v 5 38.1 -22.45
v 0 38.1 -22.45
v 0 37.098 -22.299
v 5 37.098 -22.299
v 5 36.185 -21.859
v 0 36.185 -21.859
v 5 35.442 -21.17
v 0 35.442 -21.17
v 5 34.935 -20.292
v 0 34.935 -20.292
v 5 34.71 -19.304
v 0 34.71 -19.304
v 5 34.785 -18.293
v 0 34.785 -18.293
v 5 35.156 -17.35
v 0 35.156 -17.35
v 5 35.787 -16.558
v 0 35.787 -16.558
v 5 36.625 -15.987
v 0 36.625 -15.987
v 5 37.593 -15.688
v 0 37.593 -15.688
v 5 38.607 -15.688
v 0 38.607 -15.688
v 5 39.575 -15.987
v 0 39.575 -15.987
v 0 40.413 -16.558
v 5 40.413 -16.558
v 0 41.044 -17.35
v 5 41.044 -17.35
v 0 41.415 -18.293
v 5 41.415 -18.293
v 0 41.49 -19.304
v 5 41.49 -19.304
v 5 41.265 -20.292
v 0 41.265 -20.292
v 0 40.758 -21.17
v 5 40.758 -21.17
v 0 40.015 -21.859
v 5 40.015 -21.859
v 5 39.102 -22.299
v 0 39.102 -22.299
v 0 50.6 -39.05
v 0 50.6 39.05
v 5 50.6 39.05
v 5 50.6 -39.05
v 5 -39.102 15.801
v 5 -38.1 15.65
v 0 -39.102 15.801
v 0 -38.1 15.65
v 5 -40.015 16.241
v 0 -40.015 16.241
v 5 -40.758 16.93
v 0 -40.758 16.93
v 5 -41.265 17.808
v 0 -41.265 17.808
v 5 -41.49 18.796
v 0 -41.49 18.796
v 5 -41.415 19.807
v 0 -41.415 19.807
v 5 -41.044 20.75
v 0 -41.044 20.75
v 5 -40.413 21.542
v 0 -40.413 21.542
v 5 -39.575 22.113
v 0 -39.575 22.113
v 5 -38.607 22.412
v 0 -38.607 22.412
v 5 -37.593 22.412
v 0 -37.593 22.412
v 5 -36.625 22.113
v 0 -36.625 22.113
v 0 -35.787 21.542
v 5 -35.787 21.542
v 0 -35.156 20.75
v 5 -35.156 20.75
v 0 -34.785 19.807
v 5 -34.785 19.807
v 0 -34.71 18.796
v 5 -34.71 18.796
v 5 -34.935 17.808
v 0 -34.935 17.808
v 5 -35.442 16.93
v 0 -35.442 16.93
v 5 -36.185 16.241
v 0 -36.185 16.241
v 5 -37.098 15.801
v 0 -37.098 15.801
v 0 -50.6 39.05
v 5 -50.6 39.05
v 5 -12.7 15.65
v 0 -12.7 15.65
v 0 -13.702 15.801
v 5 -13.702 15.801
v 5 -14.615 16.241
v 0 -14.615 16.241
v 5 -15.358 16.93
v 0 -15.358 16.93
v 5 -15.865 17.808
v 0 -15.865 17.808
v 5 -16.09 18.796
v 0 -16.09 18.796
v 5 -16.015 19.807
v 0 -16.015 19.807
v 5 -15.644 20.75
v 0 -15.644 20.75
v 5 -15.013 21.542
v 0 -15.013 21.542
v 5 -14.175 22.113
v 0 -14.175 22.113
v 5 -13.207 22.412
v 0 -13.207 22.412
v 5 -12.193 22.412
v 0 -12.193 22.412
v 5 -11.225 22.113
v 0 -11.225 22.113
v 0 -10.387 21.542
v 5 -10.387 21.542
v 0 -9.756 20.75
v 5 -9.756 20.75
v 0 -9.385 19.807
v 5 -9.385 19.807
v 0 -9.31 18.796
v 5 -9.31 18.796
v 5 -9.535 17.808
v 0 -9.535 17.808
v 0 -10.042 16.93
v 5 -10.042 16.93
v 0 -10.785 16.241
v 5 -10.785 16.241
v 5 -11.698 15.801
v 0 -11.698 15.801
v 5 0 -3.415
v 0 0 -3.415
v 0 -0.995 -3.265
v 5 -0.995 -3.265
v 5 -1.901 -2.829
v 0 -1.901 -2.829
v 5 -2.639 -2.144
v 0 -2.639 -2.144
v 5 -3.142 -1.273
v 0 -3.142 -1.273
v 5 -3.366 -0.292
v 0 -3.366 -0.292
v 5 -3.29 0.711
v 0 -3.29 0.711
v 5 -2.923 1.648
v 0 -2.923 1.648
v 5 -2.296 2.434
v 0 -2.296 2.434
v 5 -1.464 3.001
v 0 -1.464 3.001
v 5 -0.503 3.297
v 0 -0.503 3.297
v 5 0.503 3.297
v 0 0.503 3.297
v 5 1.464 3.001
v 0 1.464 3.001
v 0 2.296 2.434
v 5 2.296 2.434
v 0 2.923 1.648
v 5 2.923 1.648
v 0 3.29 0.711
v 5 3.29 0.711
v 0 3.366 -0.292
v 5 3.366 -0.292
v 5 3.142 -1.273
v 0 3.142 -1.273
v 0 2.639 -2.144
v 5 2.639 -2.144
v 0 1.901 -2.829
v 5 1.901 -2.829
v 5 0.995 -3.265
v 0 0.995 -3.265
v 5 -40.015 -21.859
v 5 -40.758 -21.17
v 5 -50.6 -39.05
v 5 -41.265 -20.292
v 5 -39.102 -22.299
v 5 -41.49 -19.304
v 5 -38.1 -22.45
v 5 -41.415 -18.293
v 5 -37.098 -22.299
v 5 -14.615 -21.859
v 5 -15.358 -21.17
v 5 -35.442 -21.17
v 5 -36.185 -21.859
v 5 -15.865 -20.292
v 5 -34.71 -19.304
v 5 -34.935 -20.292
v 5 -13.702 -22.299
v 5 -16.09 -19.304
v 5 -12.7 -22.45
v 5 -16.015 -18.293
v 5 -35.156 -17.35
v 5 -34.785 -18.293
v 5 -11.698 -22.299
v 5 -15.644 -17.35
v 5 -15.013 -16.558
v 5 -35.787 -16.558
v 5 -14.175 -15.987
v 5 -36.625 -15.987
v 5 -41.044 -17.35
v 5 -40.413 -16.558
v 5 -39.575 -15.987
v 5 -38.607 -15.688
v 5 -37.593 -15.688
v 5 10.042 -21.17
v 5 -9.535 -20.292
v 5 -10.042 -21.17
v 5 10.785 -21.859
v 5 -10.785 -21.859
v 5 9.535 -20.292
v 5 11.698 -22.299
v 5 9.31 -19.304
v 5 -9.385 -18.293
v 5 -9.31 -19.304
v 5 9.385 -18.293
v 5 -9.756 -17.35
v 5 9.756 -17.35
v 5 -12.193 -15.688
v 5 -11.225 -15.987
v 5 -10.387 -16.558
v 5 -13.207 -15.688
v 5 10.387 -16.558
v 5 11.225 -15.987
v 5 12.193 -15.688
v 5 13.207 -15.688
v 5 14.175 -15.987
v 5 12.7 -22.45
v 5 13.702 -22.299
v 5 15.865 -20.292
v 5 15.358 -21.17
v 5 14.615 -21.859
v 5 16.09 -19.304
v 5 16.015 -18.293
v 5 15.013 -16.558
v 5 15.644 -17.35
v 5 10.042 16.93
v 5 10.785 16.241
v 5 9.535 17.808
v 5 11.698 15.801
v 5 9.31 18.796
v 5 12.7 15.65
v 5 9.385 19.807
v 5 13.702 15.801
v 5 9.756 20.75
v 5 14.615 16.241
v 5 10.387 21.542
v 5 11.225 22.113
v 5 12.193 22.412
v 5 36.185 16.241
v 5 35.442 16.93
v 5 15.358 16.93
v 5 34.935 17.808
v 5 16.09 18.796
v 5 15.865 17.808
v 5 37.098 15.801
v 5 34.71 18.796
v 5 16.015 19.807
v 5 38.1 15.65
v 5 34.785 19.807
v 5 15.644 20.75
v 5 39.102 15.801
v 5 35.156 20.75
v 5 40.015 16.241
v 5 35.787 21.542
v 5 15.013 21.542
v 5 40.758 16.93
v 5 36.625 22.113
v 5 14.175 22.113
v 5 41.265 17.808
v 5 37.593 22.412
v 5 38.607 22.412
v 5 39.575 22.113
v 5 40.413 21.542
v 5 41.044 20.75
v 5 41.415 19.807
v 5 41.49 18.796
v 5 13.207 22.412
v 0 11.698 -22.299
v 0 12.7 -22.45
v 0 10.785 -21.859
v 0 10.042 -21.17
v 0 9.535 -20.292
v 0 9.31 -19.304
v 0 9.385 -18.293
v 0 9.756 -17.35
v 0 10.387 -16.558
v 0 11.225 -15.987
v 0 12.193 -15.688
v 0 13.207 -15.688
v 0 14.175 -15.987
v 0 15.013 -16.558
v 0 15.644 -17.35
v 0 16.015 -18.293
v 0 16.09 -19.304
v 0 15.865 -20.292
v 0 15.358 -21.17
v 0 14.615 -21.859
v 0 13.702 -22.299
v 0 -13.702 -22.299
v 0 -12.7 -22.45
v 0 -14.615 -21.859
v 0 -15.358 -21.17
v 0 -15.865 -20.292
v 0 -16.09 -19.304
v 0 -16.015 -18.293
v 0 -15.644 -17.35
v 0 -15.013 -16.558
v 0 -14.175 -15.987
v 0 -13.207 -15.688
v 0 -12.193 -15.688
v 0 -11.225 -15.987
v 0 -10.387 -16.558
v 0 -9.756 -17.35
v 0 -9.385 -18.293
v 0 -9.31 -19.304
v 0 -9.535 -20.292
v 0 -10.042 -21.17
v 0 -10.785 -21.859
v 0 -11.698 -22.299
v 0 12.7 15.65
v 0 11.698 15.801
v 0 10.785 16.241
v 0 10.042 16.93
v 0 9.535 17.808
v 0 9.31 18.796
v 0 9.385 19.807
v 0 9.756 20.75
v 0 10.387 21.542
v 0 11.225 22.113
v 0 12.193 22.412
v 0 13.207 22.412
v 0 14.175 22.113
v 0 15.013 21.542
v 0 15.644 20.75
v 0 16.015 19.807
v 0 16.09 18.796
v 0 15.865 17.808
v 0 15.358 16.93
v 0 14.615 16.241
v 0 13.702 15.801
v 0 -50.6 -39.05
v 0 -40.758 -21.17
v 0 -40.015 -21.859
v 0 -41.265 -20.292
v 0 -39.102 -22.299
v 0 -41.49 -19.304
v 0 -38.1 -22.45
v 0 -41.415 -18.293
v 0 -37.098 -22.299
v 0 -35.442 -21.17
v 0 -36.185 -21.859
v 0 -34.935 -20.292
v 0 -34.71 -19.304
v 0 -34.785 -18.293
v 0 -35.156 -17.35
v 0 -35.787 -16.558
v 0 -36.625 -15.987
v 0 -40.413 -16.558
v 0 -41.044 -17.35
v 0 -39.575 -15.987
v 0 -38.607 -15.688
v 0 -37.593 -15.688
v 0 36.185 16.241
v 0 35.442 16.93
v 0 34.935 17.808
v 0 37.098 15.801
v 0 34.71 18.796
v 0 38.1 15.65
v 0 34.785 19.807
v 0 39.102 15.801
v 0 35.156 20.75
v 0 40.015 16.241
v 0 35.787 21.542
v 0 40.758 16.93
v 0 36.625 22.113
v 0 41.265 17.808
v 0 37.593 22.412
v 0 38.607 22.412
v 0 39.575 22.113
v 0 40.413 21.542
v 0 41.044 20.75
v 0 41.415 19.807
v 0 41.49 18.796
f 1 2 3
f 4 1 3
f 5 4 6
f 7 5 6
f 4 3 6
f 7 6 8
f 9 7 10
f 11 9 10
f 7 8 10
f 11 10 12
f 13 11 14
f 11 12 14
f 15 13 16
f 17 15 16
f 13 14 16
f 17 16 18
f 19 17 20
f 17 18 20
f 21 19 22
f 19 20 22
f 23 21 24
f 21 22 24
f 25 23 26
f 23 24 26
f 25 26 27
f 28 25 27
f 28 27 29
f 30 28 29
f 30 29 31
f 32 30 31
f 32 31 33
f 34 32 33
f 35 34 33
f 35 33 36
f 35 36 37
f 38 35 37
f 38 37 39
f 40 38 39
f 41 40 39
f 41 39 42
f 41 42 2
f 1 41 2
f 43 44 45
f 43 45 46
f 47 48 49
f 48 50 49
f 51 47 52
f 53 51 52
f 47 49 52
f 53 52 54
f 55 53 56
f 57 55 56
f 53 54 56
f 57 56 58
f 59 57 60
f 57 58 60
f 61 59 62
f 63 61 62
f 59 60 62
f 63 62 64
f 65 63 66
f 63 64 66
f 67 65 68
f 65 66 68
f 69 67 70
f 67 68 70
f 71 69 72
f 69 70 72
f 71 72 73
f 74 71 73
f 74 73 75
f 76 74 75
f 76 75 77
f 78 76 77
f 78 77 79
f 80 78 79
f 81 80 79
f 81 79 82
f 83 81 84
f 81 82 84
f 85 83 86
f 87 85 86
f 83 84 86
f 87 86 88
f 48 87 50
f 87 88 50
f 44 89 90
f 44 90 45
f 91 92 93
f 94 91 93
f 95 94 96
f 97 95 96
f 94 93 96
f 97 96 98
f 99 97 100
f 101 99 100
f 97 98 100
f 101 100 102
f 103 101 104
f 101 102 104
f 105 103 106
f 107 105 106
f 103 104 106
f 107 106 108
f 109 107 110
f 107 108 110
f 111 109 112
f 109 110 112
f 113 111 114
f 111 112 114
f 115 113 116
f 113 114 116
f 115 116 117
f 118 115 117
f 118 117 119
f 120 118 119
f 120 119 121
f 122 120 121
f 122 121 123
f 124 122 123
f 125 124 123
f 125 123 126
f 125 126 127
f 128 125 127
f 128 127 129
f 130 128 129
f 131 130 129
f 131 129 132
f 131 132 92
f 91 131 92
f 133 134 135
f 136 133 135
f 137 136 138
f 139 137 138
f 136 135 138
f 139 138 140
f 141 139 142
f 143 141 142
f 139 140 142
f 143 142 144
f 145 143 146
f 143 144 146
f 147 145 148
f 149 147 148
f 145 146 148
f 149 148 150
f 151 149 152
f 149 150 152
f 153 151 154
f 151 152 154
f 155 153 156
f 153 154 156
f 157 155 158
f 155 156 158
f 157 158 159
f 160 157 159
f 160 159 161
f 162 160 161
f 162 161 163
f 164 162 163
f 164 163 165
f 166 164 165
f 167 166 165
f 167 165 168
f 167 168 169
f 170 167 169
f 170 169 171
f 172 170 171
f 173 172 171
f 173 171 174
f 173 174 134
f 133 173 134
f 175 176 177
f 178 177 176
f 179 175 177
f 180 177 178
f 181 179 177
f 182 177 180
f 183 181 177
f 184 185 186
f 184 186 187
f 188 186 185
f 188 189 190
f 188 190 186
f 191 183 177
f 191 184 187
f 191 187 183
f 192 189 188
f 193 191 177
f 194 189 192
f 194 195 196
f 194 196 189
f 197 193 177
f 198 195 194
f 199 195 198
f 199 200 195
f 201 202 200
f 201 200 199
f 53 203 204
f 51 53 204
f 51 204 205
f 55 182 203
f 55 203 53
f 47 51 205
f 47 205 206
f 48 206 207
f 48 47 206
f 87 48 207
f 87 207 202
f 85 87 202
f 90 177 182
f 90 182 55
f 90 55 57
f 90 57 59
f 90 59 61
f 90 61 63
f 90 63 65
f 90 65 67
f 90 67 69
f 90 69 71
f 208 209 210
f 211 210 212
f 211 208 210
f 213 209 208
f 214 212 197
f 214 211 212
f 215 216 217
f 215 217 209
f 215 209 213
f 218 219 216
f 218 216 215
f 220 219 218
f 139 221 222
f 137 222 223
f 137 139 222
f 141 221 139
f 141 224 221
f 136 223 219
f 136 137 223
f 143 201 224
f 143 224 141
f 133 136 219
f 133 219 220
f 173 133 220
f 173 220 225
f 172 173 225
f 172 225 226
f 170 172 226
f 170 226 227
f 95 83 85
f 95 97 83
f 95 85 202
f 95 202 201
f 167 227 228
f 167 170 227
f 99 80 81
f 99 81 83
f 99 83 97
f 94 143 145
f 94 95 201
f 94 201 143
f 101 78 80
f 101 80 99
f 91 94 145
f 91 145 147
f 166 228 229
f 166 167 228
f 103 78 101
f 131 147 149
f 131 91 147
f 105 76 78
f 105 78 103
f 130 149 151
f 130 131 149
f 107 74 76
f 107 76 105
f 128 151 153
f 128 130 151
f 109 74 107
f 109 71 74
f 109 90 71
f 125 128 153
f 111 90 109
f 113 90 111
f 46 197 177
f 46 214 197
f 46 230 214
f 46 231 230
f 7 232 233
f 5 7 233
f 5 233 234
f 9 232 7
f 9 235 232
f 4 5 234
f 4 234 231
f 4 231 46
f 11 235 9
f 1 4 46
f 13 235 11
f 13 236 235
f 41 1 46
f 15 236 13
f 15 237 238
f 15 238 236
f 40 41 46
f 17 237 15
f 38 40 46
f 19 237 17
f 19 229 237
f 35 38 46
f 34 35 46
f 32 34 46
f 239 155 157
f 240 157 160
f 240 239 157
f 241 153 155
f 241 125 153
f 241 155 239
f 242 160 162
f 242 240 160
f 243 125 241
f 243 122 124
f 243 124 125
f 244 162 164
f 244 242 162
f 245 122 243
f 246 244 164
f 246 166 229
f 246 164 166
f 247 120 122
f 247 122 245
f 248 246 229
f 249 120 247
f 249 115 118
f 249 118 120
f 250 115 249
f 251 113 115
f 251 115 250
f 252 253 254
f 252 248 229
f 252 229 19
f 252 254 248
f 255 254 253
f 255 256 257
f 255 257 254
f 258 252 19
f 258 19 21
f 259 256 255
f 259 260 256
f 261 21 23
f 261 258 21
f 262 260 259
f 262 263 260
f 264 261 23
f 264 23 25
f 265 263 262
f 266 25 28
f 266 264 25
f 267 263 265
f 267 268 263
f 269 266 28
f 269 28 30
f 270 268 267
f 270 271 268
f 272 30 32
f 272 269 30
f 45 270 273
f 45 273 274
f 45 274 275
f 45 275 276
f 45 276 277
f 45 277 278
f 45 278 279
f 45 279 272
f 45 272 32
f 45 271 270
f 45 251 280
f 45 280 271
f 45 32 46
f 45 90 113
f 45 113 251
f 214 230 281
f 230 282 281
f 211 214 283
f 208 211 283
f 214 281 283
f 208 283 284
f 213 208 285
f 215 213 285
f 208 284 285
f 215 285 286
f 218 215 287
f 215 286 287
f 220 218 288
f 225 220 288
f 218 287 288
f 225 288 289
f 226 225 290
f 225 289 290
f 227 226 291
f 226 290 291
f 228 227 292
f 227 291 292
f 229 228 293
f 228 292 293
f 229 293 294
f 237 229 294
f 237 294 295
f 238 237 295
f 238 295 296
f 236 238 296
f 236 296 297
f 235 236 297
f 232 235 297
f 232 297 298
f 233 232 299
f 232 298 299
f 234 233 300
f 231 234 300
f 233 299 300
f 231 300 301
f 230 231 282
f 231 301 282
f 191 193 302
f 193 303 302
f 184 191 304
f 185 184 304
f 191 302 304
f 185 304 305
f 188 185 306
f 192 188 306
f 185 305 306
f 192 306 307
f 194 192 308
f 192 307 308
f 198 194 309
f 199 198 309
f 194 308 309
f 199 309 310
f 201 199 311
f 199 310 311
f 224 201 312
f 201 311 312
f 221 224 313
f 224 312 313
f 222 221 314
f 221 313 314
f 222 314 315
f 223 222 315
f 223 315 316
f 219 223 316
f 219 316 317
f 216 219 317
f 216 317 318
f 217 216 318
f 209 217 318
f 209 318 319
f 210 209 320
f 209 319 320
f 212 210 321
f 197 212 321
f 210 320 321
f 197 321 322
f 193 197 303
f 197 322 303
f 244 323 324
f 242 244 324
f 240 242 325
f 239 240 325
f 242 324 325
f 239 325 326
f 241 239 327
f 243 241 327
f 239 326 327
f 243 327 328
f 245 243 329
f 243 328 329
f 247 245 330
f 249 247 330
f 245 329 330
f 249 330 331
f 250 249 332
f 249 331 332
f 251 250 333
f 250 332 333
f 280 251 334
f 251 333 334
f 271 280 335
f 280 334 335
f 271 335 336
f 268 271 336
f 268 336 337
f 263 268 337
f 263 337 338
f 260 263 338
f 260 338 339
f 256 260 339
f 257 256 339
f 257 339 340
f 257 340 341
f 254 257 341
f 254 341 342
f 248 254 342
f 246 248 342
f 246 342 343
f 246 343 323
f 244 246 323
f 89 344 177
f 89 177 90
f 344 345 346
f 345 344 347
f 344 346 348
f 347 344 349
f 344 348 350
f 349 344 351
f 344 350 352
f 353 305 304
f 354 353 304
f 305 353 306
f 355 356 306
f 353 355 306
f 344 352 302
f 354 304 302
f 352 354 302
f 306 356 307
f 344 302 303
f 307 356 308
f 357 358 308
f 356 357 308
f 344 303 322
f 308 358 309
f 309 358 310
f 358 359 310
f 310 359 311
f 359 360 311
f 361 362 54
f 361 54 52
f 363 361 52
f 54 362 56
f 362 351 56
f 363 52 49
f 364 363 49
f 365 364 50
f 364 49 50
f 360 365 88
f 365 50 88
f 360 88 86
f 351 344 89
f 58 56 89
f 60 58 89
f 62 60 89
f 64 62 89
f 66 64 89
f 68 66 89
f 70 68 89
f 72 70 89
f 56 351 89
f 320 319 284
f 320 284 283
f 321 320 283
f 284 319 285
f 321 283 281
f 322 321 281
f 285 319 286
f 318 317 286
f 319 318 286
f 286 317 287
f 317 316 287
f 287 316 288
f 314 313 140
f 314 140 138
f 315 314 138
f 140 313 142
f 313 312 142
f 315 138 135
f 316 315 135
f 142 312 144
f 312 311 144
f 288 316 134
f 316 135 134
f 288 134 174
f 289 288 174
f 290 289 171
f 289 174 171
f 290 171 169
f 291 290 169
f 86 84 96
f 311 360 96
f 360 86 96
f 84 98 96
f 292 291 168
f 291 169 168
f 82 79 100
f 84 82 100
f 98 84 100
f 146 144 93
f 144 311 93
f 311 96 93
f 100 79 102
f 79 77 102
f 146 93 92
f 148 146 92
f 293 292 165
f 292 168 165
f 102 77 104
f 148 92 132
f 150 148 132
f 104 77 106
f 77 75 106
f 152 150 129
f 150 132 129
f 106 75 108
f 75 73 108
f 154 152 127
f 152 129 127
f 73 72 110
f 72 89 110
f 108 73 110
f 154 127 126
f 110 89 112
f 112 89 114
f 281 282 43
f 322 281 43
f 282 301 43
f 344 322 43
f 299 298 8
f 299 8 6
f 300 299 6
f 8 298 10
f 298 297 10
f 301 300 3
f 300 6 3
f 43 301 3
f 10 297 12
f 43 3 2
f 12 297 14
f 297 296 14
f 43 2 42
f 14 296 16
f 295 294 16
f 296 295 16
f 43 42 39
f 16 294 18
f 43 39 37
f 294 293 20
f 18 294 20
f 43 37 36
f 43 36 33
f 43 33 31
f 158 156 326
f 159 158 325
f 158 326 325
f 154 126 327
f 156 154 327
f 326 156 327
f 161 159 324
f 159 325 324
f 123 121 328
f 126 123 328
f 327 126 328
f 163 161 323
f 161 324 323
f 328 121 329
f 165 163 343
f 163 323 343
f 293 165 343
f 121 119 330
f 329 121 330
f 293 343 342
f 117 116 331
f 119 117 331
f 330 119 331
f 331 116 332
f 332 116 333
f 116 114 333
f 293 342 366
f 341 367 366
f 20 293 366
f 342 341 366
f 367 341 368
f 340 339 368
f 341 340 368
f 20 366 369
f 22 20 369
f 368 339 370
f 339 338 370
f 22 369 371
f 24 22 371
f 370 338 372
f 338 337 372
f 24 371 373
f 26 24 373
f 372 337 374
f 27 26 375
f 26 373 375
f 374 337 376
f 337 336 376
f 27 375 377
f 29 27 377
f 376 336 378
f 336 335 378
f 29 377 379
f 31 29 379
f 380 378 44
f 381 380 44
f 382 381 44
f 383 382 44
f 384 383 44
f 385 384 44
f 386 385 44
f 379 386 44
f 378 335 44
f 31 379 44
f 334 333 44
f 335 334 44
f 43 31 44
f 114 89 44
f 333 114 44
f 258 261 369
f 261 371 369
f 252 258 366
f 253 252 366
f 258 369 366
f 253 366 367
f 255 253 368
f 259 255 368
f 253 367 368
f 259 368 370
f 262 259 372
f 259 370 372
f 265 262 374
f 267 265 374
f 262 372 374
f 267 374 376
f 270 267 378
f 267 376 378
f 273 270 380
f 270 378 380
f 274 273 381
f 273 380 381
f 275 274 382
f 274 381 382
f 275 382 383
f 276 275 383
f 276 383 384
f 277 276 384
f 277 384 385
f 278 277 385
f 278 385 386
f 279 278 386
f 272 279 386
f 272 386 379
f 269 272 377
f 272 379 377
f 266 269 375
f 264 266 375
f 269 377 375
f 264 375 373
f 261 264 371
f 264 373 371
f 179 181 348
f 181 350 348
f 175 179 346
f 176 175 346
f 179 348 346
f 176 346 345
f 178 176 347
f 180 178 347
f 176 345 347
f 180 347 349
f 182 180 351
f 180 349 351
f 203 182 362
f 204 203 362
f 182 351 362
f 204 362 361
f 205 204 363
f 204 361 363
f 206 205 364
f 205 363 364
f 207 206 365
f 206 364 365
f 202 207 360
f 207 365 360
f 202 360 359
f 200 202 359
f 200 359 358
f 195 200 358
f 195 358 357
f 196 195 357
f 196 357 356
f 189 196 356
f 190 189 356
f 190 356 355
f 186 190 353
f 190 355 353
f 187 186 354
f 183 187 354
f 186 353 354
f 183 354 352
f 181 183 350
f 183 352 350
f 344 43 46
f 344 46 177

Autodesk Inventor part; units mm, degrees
ref_plane "YZ Plane" through (0, 0, 0) normal (1, 0, 0) x (0, 1, 0)
ref_plane "XZ Plane" through (0, 0, 0) normal (0, 1, 0) x (-1, 0, 0)
ref_plane "XY Plane" through (0, 0, 0) normal (0, 0, 1) x (1, 0, 0)
sketch "Sketch5" plane through (0, 0, 0) normal (1, 0, 0) x (0, 1, 0)
  line L0 (50.6, -39.05) -> (-50.6, -39.05)
  line L1 (-50.6, -39.05) -> (-50.6, 39.05)
  line L2 (-50.6, 39.05) -> (50.6, 39.05)
  line L3 (50.6, 39.05) -> (50.6, -39.05)
  line L4 (50.6, -39.05) -> (-50.6, 39.05) construction
  line L5 (-50.6, -39.05) -> (50.6, 39.05) construction
  point P0 (0, 0)
  dimension "d31" = 78.1
  dimension "d32" = 101.2
extrude "Extrusion2" add sketch "Sketch5" along normal blind 5
sketch "Sketch10" plane through (5, 0, 0) normal (1, 0, 0) x (0, 0, -1)
  line L0 (39.05, 50.6) -> (-39.05, 50.6) projected
  line L1 (39.05, -50.6) -> (39.05, 50.6) projected
  point P0 (0, 0)
  point P1 (19.05, 38.1)
  dimension "d93" = 12.5
  dimension "d103" = 20
hole "Hole8" at (5, 38.1, -19.05) direction (-1, 0, 0) diameter 6.8 end through all
sketch "Sketch11" plane through (5, 0, 0) normal (1, 0, 0) x (0, 0, -1)
  circle A0 centre (19.05, 38.1) radius 3.4 projected
  point P0 (0, 0)
  point P1 (-19.05, 38.1)
  dimension "d85" = 38.1
  dimension "d86" = 0
hole "Hole9" at (5, 38.1, 19.05) direction (-1, 0, 0) diameter 6.8 end through all
pattern_linear "Rectangular Pattern1" count 6 spacing 25.4 along (0, -1, 0) of "Hole8"
pattern_linear "Rectangular Pattern2" count 6 spacing 25.4 along (0, -1, 0) of "Hole9"
sketch "Sketch12" plane through (5, 0, 0) normal (1, 0, 0) x (0, 0, -1)
  line L0 (39.05, -50.6) -> (39.05, 50.6) projected
  line L1 (-39.05, -50.6) -> (39.05, -50.6) projected
  point P0 (0, 0)
  point P1 (0.04, 0)
  dimension "d101" = 39.01
  dimension "d102" = 50.6
hole "Hole10" at (5, 0, -0.04) direction (-1, 0, 0) diameter 6.75 end through all
properties part number "base_plate"
